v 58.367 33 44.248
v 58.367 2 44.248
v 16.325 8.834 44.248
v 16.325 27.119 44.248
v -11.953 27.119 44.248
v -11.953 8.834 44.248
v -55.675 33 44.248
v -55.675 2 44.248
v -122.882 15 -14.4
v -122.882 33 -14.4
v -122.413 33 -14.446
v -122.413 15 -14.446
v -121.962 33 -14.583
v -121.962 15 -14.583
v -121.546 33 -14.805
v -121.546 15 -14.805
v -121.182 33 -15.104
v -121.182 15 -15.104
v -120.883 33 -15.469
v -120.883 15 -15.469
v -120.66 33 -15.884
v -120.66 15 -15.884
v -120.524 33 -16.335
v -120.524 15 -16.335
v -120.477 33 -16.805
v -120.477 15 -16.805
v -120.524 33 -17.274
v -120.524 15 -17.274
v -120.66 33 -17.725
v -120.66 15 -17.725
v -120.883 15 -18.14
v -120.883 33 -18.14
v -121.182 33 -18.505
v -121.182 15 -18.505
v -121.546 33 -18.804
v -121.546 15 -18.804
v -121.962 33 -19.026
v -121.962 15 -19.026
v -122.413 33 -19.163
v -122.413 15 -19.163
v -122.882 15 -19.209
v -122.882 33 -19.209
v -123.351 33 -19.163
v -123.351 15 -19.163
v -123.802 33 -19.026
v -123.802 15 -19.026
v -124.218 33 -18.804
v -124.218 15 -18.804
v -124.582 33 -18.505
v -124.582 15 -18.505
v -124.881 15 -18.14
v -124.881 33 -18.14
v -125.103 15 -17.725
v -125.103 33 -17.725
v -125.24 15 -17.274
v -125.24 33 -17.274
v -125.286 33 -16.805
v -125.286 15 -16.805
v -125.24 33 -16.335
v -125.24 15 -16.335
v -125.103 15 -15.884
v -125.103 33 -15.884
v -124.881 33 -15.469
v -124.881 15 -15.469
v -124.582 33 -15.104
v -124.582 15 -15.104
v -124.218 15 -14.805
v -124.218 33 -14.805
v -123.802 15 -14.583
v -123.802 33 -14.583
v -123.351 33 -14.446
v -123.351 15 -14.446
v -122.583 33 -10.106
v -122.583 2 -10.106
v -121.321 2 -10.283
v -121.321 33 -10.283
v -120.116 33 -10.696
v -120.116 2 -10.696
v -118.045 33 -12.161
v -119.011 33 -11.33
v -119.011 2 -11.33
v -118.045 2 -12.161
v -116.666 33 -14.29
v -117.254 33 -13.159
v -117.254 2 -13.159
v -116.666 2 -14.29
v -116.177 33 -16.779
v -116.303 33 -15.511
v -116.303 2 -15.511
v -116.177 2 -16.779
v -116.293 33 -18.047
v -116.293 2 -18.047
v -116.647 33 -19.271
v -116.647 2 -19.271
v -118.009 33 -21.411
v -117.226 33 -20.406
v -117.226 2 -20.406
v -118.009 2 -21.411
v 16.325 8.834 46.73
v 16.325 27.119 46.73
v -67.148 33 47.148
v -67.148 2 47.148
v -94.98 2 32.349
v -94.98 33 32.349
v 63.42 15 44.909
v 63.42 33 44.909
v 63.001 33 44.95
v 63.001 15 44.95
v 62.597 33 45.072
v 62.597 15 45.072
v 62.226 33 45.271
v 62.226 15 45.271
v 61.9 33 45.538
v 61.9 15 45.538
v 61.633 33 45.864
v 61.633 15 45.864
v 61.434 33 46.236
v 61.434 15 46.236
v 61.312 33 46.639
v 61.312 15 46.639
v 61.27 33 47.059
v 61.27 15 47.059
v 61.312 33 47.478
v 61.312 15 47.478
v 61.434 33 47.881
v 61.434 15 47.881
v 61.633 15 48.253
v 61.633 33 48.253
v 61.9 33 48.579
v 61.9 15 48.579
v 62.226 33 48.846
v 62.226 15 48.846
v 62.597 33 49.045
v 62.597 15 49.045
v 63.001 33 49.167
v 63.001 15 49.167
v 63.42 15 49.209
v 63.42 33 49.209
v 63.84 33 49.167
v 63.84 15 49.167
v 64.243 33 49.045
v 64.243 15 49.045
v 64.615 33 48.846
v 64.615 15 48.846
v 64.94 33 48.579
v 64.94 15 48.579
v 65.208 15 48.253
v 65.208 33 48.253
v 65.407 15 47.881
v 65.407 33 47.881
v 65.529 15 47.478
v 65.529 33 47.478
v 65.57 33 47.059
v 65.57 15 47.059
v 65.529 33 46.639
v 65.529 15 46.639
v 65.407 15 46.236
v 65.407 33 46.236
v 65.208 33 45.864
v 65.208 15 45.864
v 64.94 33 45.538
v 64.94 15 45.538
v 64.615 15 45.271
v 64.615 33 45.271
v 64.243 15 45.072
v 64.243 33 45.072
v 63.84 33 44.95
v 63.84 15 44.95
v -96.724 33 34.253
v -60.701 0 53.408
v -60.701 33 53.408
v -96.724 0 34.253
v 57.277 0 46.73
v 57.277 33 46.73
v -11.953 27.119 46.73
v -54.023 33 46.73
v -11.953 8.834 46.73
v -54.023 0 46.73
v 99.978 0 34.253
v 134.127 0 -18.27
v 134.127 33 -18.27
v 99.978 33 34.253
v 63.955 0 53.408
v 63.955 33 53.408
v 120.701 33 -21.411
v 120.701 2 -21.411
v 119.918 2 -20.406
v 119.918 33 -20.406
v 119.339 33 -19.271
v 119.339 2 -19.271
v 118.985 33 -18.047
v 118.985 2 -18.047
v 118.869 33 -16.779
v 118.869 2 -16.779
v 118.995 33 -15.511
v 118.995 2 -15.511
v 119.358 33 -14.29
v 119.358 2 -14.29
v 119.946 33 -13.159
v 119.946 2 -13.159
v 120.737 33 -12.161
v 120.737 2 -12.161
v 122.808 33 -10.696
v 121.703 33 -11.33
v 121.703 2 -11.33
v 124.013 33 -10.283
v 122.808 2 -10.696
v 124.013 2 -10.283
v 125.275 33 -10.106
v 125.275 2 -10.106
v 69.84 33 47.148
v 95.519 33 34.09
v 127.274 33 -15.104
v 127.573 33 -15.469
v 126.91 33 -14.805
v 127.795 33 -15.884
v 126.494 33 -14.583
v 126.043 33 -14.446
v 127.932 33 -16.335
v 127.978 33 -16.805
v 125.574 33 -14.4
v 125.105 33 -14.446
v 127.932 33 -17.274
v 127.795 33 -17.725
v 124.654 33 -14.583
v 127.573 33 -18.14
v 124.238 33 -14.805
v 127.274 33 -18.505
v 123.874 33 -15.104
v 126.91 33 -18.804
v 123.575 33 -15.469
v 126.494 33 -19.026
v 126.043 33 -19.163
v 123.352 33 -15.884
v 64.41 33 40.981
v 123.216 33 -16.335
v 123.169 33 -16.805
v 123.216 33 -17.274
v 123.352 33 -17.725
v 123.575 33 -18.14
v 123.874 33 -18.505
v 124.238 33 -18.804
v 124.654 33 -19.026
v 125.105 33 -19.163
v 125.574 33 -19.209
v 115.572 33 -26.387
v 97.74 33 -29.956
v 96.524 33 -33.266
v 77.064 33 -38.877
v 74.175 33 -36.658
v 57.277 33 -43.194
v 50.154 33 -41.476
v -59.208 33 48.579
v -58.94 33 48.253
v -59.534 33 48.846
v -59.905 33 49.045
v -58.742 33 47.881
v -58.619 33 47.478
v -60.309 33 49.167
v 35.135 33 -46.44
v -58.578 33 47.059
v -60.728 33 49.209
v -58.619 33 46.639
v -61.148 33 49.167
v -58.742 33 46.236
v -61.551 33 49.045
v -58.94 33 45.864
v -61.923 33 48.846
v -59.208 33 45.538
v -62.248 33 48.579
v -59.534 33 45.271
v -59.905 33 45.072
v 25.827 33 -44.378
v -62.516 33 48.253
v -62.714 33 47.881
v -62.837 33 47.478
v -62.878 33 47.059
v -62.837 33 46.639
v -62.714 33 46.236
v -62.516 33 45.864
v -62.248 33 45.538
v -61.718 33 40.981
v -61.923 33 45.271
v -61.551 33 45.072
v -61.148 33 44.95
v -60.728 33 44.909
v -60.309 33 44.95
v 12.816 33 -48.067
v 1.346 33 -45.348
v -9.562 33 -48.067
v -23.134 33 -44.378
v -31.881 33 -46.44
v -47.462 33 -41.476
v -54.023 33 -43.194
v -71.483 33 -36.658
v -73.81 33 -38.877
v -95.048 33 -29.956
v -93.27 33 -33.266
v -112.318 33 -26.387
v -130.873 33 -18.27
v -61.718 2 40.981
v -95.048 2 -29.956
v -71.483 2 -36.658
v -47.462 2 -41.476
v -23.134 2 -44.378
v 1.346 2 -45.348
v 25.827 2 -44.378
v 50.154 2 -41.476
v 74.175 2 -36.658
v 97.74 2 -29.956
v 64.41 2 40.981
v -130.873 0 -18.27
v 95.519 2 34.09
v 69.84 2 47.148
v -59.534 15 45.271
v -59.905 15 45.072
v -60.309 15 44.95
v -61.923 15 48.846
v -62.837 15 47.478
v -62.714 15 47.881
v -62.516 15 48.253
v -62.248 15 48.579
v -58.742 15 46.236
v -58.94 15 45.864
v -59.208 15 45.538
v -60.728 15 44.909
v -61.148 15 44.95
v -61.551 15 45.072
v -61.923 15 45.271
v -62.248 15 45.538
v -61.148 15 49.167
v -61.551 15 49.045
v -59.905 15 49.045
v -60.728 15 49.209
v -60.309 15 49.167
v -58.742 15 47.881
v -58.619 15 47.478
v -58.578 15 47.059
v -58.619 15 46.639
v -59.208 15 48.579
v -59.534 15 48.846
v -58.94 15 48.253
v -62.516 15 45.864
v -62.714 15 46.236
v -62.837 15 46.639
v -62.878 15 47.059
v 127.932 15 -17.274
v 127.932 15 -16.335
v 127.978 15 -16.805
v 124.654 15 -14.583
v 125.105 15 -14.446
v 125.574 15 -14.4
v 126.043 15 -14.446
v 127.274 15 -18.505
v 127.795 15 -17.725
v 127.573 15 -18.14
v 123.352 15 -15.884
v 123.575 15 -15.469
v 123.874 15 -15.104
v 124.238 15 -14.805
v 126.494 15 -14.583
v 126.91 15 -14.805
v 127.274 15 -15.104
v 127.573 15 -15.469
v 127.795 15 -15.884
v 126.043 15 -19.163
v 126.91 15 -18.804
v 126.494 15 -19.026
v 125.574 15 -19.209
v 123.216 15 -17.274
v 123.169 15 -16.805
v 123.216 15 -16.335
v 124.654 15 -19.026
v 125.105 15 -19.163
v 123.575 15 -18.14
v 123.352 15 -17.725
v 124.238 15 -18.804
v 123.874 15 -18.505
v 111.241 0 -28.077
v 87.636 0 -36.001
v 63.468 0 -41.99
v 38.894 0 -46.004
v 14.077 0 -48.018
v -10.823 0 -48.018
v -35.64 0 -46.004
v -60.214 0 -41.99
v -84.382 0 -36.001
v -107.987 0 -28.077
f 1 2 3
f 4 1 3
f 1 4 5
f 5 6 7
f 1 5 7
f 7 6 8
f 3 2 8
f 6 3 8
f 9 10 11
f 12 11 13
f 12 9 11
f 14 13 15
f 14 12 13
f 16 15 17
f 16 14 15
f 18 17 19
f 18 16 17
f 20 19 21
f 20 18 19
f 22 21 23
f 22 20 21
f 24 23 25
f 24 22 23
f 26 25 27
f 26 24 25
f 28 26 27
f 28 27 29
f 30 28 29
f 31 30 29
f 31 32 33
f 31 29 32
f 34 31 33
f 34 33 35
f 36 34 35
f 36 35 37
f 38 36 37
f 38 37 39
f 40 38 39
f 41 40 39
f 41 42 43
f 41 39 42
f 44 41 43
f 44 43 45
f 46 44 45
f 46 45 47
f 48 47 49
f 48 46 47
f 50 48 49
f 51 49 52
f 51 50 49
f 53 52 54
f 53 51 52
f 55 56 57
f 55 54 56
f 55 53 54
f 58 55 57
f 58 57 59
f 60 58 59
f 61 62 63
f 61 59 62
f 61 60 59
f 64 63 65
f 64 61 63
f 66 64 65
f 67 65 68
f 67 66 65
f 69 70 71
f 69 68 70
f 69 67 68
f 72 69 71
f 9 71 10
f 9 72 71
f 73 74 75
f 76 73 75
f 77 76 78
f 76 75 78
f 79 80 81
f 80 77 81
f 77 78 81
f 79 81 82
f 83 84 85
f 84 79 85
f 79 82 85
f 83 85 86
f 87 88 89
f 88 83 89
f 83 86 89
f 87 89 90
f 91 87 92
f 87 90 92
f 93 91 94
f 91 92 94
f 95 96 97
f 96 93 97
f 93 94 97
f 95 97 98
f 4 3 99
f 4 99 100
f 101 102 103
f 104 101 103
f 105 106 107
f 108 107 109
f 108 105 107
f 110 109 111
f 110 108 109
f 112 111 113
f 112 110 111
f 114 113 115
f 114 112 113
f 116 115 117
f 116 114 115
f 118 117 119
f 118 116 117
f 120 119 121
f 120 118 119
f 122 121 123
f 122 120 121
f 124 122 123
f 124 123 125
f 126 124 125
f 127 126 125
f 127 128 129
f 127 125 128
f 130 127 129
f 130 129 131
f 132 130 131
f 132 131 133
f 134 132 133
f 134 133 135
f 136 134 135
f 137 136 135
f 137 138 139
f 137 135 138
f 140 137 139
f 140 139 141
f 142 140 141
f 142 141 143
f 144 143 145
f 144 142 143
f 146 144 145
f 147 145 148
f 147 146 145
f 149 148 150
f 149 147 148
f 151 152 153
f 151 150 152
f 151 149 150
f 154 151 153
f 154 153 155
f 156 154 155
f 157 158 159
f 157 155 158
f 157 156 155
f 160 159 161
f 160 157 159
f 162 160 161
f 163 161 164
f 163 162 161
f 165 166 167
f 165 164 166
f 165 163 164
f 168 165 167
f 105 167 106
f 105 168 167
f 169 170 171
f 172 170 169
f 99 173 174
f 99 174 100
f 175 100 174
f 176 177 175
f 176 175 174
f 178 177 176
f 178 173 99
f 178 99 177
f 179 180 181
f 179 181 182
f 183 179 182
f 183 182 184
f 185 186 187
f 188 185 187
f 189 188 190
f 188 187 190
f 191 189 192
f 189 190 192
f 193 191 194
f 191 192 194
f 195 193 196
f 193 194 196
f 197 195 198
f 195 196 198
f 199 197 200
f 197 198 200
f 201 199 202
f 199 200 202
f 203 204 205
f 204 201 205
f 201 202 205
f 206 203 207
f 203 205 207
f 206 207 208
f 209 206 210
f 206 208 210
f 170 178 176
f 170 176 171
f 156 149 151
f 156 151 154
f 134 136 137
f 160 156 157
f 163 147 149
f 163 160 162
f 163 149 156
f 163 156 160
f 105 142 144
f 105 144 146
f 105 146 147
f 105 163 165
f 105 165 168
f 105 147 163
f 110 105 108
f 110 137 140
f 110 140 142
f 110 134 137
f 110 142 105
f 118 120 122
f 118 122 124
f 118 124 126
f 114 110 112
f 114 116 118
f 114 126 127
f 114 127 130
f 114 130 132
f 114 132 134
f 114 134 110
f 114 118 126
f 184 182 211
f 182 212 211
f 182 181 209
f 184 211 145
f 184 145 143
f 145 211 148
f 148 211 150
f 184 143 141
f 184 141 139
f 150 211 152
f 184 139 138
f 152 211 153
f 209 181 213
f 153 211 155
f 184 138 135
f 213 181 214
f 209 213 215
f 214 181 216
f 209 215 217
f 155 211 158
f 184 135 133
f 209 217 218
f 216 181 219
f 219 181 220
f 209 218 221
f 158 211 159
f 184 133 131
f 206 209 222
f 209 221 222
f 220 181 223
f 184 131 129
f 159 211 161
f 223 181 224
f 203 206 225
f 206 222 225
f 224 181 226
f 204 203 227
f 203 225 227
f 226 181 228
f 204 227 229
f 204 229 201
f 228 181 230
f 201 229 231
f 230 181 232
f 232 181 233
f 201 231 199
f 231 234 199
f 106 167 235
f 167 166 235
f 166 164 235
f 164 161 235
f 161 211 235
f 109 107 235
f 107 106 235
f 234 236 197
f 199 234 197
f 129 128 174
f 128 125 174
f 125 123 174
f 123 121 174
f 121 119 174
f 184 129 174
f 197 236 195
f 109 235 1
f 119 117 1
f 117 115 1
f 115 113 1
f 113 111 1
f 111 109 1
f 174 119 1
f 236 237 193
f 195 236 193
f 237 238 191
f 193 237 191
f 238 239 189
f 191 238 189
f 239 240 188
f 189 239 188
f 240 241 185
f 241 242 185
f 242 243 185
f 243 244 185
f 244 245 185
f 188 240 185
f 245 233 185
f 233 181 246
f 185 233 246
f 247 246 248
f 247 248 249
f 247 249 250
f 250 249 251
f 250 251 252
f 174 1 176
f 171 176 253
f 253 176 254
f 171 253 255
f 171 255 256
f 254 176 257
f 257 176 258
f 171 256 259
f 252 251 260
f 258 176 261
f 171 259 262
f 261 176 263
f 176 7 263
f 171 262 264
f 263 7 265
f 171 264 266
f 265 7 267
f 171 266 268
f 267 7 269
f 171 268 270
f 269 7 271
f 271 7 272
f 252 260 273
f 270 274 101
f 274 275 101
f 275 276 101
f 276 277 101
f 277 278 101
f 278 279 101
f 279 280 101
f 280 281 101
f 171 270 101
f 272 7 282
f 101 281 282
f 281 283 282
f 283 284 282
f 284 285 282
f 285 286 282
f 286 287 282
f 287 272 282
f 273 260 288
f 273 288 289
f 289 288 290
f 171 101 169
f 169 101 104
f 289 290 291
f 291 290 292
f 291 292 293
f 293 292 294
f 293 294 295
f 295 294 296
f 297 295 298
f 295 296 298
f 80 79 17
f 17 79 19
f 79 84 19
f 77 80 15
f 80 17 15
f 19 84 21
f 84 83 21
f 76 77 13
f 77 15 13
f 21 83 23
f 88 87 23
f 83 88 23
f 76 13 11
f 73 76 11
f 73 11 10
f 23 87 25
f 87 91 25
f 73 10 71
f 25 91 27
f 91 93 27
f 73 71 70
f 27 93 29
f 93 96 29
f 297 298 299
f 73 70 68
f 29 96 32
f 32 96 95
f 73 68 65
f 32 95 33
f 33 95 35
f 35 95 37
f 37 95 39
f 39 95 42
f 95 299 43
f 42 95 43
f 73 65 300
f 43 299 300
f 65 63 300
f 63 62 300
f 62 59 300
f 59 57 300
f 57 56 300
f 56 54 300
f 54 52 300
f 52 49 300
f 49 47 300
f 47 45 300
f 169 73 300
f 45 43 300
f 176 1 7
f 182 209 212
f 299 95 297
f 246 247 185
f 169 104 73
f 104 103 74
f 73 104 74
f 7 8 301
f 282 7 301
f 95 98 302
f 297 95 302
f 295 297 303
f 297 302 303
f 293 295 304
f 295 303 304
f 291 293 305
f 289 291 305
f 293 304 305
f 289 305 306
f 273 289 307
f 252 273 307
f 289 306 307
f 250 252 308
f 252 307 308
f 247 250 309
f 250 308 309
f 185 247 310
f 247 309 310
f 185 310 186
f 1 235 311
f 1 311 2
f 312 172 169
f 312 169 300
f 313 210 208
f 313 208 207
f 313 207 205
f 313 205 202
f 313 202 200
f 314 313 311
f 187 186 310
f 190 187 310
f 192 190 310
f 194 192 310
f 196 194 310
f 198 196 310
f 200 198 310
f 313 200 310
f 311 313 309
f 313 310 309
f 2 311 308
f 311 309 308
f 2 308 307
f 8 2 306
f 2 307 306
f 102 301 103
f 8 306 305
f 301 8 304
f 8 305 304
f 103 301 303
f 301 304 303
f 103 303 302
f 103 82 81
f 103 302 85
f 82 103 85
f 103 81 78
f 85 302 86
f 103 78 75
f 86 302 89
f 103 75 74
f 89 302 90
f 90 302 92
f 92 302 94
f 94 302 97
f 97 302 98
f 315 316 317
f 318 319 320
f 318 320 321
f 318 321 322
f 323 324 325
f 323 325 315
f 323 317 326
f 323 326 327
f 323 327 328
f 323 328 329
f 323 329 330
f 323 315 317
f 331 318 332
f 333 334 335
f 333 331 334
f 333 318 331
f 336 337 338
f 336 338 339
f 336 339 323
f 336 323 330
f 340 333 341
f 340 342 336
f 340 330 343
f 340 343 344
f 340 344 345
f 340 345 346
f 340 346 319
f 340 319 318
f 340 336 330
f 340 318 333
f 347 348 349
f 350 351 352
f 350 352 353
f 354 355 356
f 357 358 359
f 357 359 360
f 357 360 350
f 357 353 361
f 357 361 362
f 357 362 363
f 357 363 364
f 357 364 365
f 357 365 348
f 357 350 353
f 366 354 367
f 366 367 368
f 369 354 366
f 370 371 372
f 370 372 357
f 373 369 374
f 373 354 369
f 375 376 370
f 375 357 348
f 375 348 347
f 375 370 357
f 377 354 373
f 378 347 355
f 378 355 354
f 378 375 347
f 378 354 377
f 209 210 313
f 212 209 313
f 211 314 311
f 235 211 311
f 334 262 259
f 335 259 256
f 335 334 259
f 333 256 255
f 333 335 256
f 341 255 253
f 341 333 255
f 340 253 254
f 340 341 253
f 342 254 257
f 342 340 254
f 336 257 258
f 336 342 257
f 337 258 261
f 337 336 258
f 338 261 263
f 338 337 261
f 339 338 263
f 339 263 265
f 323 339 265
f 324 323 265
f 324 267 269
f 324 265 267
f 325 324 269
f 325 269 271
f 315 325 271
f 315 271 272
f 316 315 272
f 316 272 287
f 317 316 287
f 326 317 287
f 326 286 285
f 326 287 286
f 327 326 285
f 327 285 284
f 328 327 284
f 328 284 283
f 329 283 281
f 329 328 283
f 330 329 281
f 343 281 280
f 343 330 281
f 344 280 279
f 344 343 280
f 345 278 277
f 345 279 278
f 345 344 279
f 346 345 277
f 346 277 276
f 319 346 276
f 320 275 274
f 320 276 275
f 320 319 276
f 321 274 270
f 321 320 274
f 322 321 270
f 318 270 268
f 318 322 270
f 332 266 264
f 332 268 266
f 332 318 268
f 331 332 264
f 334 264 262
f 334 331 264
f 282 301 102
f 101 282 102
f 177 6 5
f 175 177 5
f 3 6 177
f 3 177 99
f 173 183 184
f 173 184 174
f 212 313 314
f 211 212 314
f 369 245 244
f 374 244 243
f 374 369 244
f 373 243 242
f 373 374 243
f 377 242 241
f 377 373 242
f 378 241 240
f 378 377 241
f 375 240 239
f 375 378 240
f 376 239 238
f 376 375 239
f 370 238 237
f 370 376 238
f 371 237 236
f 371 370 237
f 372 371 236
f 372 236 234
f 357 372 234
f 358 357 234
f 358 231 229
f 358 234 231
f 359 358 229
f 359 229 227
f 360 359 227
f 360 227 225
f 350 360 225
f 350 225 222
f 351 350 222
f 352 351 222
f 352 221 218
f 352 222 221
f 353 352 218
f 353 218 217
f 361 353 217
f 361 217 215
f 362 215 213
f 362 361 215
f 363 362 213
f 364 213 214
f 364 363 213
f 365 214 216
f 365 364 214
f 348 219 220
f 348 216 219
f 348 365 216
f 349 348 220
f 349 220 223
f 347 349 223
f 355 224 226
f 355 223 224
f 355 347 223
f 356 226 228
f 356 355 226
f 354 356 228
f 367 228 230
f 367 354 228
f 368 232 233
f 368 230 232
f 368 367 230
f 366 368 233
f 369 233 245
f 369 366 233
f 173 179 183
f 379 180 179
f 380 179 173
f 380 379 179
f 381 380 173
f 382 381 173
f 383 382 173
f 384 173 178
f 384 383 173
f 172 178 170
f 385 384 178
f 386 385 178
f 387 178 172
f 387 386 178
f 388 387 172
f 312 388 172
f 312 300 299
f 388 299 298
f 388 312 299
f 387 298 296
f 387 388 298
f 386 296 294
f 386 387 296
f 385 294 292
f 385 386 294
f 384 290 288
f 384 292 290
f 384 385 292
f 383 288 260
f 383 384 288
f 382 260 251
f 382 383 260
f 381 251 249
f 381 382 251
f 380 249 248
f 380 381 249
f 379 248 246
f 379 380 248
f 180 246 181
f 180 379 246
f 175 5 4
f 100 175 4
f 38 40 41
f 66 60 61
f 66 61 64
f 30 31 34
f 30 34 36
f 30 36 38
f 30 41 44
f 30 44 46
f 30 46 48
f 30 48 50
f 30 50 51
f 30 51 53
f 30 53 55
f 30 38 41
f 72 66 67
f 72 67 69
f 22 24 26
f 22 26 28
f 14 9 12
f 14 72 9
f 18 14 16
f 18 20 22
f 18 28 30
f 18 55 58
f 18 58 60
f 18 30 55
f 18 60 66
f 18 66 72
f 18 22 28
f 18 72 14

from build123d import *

# Parameters (mm, degrees)
SKETCH1_W           = 95.3
SKETCH1_H           = 79
BOSS_EXTRUDE1_DEPTH = 33
SKETCH5_W           = 16.412638375
SKETCH5_H           = 11.424483575
CUT_EXTRUDE3_DEPTH  = 51
SKETCH4_W           = 19.8
SKETCH4_H           = 11.7
CUT_EXTRUDE4_DEPTH  = 51
BOSS_EXTRUDE2_START = 30
BOSS_EXTRUDE2_DEPTH = 3
CUT_EXTRUDE6_START  = 2
SKETCH3_W           = 91.3
SKETCH3_H           = 75
CUT_EXTRUDE6_DEPTH  = 33
BOSS_EXTRUDE3_DEPTH = 33
CUT_EXTRUDE7_START  = 2
CUT_EXTRUDE7_DEPTH  = 33
SKETCH13_W          = 28.277376506
SKETCH13_H          = 18.284619395
CUT_EXTRUDE8_DEPTH  = 63
CUT_EXTRUDE9_START  = 15
SKETCH15_R          = 2.404549827
SKETCH15_R_2        = 2.15
CUT_EXTRUDE9_DEPTH  = 63


with BuildPart() as part:
    # Sketch1 → Boss-Extrude1 (new body)
    with BuildSketch(Plane(origin=(0, 0, 0), x_dir=(1, 0, 0), z_dir=(0, 1, 0))):
        with Locations((1.627011494, 0.770114943)):
            Rectangle(SKETCH1_W, SKETCH1_H)
    extrude(amount=BOSS_EXTRUDE1_DEPTH)

    # Sketch5 → Cut-Extrude3 (cut)
    with BuildSketch(Plane(origin=(0, 0, 0), x_dir=(0, 0, -1), z_dir=(1, 0, 0))):
        with Locations((21.044550583, 16.58045411)):
            Rectangle(SKETCH5_W, SKETCH5_H)
    extrude(amount=CUT_EXTRUDE3_DEPTH, mode=Mode.SUBTRACT)

    # Sketch4 → Cut-Extrude4 (cut)
    with BuildSketch(Plane.XY):
        with Locations((-28.653400332, 16.73218903)):
            Rectangle(SKETCH4_W, SKETCH4_H)
    extrude(amount=CUT_EXTRUDE4_DEPTH, mode=Mode.SUBTRACT)

    # Sketch6 → Boss-Extrude2 (add)
    with BuildSketch(Plane(origin=(0, 0, 0), x_dir=(1, 0, 0), z_dir=(0, 1, 0)).offset(BOSS_EXTRUDE2_START)):
        with BuildLine():
            Line((-54.022988506, -46.729885057), (57.277011494, -46.729885057))
            Line((57.277011494, -46.729885057), (57.277011494, 43.194295461))
            ThreePointArc((57.277011494, 43.194295461), (1.627011494, 48.270114943), (-54.022988506, 43.194295461))
            Line((-54.022988506, 43.194295461), (-54.022988506, -46.729885057))
        make_face()
    extrude(amount=BOSS_EXTRUDE2_DEPTH)

    # Sketch3 → Cut-Extrude6 (cut)
    with BuildSketch(Plane(origin=(0, 0, 0), x_dir=(1, 0, 0), z_dir=(0, 1, 0)).offset(CUT_EXTRUDE6_START)):
        with Locations((1.627011494, 0.770114943)):
            Rectangle(SKETCH3_W, SKETCH3_H)
    extrude(amount=CUT_EXTRUDE6_DEPTH, mode=Mode.SUBTRACT)

    # Sketch7 → Boss-Extrude3 (add)
    with BuildSketch(Plane(origin=(0, 0, 0), x_dir=(1, 0, 0), z_dir=(0, 1, 0))):
        with BuildLine():
            Line((-54.022988506, -46.729885057), (-60.700936328, -53.40783288))
            Line((-60.700936328, -53.40783288), (-96.723977713, -34.253129761))
            Line((-96.723977713, -34.253129761), (-130.872988506, 18.270114943))
            ThreePointArc((-130.872988506, 18.270114943), (1.627011494, 48.270114943), (134.127011494, 18.270114943))
            Line((134.127011494, 18.270114943), (99.978000701, -34.253129761))
            Line((99.978000701, -34.253129761), (63.954959317, -53.40783288))
            Line((63.954959317, -53.40783288), (57.277011494, -46.729885057))
            Line((57.277011494, -46.729885057), (-54.022988506, -46.729885057))
        make_face()
    extrude(amount=BOSS_EXTRUDE3_DEPTH)

    # Sketch12 → Cut-Extrude7 (cut)
    with BuildSketch(Plane(origin=(0, 0, 0), x_dir=(1, 0, 0), z_dir=(0, 1, 0)).offset(CUT_EXTRUDE7_START)):
        with BuildLine():
            Line((-55.675241183, -44.247946624), (-61.717664186, -40.981103814))
            Line((-61.717664186, -40.981103814), (-67.147920345, -47.148292557))
            Line((-67.147920345, -47.148292557), (-94.980050769, -32.348981479))
            Line((-94.980050769, -32.348981479), (-122.582923998, 10.105907593))
            ThreePointArc((-122.582923998, 10.105907593), (-116.666047132, 14.289696558), (-118.009133951, 21.410766685))
            ThreePointArc((-118.009133951, 21.410766685), (1.346034443, 45.347959229), (120.701202837, 21.410766685))
            ThreePointArc((120.701202837, 21.410766685), (119.358116018, 14.289696558), (125.274992883, 10.105907593))
            Line((125.274992883, 10.105907593), (95.518671487, -34.090338294))
            Line((95.518671487, -34.090338294), (69.839989231, -47.148292557))
            Line((69.839989231, -47.148292557), (64.409733071, -40.981103814))
            Line((64.409733071, -40.981103814), (58.367310069, -44.247946624))
            Line((58.367310069, -44.247946624), (-55.675241183, -44.247946624))
        make_face()
    extrude(amount=CUT_EXTRUDE7_DEPTH, mode=Mode.SUBTRACT)

    # Sketch13 → Cut-Extrude8 (cut)
    with BuildSketch(Plane.XY):
        with Locations((2.186144679, 17.976259721)):
            Rectangle(SKETCH13_W, SKETCH13_H)
    extrude(amount=CUT_EXTRUDE8_DEPTH, mode=Mode.SUBTRACT)

    # Sketch15 → Cut-Extrude9 (cut)
    with BuildSketch(Plane(origin=(0, 0, 0), x_dir=(1, 0, 0), z_dir=(0, 1, 0)).offset(CUT_EXTRUDE9_START)):
        with Locations(Location((-122.881880972, 16.804537187, 0), (0, 0, 270))):
            Circle(SKETCH15_R)
        with Locations(Location((-60.728139954, -47.058565961, 0), (0, 0, 270))):
            Circle(SKETCH15_R_2)
        with Locations(Location((63.420208839, -47.058565961, 0), (0, 0, 90))):
            Circle(SKETCH15_R_2)
        with Locations(Location((125.573949857, 16.804537187, 0), (0, 0, 90))):
            Circle(SKETCH15_R)
    extrude(amount=CUT_EXTRUDE9_DEPTH, mode=Mode.SUBTRACT)


solid = part.part
